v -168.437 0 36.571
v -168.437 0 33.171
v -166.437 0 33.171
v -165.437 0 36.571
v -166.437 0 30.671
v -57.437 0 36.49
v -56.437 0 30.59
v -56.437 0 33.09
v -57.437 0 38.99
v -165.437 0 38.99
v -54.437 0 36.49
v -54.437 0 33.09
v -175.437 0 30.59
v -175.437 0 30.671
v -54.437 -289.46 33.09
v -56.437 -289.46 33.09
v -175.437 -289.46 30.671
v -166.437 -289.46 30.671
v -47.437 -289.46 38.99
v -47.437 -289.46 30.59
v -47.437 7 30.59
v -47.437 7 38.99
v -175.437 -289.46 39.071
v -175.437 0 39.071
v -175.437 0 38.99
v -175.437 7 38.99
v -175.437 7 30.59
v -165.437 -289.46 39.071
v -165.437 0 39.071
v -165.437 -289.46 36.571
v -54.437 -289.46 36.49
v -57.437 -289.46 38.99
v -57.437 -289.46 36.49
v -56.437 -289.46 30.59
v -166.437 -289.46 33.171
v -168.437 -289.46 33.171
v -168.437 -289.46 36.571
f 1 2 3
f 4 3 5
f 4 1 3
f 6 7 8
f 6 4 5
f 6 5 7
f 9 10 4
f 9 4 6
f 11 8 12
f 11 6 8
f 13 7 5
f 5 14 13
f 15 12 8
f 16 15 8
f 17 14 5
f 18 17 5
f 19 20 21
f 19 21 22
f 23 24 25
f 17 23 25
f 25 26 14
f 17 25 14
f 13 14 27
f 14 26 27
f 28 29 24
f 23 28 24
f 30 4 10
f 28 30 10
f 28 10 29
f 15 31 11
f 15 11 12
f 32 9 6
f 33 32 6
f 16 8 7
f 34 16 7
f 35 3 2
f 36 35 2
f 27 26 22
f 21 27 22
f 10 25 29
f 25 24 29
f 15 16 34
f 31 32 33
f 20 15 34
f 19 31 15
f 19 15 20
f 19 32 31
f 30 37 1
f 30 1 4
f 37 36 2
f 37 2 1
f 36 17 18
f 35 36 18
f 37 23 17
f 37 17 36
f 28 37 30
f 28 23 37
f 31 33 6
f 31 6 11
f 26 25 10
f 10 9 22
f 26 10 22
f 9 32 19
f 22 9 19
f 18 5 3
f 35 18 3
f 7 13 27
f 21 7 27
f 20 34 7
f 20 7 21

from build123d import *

# Parameters (mm, degrees)
F1_DEPTH = 289.46
F2_W     = 128
F2_H     = 8.4
F3_DEPTH = 7
F5_DEPTH = 289.46


with BuildPart() as f1:
    # F0 (on Front) → F1 (new body)
    with BuildSketch(Plane.XZ):
        Polygon((-47.436745, 38.990075), (-57.436745, 38.990075), (-57.436745, 36.490075), (-54.436745, 36.490075), (-54.436745, 33.090075), (-56.436745, 33.090075), (-56.436745, 30.590075), (-47.436745, 30.590075), align=None)
    extrude(amount=F1_DEPTH)

    # F2 (on Front) → F3 (join)
    with BuildSketch(Plane.XZ):
        with Locations((-111.436745, 34.790075)):
            Rectangle(F2_W, F2_H)
    extrude(amount=-F3_DEPTH)

    # F4 (on Front) → F5 (join)
    with BuildSketch(Plane.XZ):
        Polygon((-165.436745, 36.57085), (-165.436745, 39.07085), (-175.436745, 39.07085), (-175.436745, 30.67085), (-166.436745, 30.67085), (-166.436745, 33.17085), (-168.436745, 33.17085), (-168.436745, 36.57085), align=None)
    extrude(amount=F5_DEPTH)


solid = f1.part
